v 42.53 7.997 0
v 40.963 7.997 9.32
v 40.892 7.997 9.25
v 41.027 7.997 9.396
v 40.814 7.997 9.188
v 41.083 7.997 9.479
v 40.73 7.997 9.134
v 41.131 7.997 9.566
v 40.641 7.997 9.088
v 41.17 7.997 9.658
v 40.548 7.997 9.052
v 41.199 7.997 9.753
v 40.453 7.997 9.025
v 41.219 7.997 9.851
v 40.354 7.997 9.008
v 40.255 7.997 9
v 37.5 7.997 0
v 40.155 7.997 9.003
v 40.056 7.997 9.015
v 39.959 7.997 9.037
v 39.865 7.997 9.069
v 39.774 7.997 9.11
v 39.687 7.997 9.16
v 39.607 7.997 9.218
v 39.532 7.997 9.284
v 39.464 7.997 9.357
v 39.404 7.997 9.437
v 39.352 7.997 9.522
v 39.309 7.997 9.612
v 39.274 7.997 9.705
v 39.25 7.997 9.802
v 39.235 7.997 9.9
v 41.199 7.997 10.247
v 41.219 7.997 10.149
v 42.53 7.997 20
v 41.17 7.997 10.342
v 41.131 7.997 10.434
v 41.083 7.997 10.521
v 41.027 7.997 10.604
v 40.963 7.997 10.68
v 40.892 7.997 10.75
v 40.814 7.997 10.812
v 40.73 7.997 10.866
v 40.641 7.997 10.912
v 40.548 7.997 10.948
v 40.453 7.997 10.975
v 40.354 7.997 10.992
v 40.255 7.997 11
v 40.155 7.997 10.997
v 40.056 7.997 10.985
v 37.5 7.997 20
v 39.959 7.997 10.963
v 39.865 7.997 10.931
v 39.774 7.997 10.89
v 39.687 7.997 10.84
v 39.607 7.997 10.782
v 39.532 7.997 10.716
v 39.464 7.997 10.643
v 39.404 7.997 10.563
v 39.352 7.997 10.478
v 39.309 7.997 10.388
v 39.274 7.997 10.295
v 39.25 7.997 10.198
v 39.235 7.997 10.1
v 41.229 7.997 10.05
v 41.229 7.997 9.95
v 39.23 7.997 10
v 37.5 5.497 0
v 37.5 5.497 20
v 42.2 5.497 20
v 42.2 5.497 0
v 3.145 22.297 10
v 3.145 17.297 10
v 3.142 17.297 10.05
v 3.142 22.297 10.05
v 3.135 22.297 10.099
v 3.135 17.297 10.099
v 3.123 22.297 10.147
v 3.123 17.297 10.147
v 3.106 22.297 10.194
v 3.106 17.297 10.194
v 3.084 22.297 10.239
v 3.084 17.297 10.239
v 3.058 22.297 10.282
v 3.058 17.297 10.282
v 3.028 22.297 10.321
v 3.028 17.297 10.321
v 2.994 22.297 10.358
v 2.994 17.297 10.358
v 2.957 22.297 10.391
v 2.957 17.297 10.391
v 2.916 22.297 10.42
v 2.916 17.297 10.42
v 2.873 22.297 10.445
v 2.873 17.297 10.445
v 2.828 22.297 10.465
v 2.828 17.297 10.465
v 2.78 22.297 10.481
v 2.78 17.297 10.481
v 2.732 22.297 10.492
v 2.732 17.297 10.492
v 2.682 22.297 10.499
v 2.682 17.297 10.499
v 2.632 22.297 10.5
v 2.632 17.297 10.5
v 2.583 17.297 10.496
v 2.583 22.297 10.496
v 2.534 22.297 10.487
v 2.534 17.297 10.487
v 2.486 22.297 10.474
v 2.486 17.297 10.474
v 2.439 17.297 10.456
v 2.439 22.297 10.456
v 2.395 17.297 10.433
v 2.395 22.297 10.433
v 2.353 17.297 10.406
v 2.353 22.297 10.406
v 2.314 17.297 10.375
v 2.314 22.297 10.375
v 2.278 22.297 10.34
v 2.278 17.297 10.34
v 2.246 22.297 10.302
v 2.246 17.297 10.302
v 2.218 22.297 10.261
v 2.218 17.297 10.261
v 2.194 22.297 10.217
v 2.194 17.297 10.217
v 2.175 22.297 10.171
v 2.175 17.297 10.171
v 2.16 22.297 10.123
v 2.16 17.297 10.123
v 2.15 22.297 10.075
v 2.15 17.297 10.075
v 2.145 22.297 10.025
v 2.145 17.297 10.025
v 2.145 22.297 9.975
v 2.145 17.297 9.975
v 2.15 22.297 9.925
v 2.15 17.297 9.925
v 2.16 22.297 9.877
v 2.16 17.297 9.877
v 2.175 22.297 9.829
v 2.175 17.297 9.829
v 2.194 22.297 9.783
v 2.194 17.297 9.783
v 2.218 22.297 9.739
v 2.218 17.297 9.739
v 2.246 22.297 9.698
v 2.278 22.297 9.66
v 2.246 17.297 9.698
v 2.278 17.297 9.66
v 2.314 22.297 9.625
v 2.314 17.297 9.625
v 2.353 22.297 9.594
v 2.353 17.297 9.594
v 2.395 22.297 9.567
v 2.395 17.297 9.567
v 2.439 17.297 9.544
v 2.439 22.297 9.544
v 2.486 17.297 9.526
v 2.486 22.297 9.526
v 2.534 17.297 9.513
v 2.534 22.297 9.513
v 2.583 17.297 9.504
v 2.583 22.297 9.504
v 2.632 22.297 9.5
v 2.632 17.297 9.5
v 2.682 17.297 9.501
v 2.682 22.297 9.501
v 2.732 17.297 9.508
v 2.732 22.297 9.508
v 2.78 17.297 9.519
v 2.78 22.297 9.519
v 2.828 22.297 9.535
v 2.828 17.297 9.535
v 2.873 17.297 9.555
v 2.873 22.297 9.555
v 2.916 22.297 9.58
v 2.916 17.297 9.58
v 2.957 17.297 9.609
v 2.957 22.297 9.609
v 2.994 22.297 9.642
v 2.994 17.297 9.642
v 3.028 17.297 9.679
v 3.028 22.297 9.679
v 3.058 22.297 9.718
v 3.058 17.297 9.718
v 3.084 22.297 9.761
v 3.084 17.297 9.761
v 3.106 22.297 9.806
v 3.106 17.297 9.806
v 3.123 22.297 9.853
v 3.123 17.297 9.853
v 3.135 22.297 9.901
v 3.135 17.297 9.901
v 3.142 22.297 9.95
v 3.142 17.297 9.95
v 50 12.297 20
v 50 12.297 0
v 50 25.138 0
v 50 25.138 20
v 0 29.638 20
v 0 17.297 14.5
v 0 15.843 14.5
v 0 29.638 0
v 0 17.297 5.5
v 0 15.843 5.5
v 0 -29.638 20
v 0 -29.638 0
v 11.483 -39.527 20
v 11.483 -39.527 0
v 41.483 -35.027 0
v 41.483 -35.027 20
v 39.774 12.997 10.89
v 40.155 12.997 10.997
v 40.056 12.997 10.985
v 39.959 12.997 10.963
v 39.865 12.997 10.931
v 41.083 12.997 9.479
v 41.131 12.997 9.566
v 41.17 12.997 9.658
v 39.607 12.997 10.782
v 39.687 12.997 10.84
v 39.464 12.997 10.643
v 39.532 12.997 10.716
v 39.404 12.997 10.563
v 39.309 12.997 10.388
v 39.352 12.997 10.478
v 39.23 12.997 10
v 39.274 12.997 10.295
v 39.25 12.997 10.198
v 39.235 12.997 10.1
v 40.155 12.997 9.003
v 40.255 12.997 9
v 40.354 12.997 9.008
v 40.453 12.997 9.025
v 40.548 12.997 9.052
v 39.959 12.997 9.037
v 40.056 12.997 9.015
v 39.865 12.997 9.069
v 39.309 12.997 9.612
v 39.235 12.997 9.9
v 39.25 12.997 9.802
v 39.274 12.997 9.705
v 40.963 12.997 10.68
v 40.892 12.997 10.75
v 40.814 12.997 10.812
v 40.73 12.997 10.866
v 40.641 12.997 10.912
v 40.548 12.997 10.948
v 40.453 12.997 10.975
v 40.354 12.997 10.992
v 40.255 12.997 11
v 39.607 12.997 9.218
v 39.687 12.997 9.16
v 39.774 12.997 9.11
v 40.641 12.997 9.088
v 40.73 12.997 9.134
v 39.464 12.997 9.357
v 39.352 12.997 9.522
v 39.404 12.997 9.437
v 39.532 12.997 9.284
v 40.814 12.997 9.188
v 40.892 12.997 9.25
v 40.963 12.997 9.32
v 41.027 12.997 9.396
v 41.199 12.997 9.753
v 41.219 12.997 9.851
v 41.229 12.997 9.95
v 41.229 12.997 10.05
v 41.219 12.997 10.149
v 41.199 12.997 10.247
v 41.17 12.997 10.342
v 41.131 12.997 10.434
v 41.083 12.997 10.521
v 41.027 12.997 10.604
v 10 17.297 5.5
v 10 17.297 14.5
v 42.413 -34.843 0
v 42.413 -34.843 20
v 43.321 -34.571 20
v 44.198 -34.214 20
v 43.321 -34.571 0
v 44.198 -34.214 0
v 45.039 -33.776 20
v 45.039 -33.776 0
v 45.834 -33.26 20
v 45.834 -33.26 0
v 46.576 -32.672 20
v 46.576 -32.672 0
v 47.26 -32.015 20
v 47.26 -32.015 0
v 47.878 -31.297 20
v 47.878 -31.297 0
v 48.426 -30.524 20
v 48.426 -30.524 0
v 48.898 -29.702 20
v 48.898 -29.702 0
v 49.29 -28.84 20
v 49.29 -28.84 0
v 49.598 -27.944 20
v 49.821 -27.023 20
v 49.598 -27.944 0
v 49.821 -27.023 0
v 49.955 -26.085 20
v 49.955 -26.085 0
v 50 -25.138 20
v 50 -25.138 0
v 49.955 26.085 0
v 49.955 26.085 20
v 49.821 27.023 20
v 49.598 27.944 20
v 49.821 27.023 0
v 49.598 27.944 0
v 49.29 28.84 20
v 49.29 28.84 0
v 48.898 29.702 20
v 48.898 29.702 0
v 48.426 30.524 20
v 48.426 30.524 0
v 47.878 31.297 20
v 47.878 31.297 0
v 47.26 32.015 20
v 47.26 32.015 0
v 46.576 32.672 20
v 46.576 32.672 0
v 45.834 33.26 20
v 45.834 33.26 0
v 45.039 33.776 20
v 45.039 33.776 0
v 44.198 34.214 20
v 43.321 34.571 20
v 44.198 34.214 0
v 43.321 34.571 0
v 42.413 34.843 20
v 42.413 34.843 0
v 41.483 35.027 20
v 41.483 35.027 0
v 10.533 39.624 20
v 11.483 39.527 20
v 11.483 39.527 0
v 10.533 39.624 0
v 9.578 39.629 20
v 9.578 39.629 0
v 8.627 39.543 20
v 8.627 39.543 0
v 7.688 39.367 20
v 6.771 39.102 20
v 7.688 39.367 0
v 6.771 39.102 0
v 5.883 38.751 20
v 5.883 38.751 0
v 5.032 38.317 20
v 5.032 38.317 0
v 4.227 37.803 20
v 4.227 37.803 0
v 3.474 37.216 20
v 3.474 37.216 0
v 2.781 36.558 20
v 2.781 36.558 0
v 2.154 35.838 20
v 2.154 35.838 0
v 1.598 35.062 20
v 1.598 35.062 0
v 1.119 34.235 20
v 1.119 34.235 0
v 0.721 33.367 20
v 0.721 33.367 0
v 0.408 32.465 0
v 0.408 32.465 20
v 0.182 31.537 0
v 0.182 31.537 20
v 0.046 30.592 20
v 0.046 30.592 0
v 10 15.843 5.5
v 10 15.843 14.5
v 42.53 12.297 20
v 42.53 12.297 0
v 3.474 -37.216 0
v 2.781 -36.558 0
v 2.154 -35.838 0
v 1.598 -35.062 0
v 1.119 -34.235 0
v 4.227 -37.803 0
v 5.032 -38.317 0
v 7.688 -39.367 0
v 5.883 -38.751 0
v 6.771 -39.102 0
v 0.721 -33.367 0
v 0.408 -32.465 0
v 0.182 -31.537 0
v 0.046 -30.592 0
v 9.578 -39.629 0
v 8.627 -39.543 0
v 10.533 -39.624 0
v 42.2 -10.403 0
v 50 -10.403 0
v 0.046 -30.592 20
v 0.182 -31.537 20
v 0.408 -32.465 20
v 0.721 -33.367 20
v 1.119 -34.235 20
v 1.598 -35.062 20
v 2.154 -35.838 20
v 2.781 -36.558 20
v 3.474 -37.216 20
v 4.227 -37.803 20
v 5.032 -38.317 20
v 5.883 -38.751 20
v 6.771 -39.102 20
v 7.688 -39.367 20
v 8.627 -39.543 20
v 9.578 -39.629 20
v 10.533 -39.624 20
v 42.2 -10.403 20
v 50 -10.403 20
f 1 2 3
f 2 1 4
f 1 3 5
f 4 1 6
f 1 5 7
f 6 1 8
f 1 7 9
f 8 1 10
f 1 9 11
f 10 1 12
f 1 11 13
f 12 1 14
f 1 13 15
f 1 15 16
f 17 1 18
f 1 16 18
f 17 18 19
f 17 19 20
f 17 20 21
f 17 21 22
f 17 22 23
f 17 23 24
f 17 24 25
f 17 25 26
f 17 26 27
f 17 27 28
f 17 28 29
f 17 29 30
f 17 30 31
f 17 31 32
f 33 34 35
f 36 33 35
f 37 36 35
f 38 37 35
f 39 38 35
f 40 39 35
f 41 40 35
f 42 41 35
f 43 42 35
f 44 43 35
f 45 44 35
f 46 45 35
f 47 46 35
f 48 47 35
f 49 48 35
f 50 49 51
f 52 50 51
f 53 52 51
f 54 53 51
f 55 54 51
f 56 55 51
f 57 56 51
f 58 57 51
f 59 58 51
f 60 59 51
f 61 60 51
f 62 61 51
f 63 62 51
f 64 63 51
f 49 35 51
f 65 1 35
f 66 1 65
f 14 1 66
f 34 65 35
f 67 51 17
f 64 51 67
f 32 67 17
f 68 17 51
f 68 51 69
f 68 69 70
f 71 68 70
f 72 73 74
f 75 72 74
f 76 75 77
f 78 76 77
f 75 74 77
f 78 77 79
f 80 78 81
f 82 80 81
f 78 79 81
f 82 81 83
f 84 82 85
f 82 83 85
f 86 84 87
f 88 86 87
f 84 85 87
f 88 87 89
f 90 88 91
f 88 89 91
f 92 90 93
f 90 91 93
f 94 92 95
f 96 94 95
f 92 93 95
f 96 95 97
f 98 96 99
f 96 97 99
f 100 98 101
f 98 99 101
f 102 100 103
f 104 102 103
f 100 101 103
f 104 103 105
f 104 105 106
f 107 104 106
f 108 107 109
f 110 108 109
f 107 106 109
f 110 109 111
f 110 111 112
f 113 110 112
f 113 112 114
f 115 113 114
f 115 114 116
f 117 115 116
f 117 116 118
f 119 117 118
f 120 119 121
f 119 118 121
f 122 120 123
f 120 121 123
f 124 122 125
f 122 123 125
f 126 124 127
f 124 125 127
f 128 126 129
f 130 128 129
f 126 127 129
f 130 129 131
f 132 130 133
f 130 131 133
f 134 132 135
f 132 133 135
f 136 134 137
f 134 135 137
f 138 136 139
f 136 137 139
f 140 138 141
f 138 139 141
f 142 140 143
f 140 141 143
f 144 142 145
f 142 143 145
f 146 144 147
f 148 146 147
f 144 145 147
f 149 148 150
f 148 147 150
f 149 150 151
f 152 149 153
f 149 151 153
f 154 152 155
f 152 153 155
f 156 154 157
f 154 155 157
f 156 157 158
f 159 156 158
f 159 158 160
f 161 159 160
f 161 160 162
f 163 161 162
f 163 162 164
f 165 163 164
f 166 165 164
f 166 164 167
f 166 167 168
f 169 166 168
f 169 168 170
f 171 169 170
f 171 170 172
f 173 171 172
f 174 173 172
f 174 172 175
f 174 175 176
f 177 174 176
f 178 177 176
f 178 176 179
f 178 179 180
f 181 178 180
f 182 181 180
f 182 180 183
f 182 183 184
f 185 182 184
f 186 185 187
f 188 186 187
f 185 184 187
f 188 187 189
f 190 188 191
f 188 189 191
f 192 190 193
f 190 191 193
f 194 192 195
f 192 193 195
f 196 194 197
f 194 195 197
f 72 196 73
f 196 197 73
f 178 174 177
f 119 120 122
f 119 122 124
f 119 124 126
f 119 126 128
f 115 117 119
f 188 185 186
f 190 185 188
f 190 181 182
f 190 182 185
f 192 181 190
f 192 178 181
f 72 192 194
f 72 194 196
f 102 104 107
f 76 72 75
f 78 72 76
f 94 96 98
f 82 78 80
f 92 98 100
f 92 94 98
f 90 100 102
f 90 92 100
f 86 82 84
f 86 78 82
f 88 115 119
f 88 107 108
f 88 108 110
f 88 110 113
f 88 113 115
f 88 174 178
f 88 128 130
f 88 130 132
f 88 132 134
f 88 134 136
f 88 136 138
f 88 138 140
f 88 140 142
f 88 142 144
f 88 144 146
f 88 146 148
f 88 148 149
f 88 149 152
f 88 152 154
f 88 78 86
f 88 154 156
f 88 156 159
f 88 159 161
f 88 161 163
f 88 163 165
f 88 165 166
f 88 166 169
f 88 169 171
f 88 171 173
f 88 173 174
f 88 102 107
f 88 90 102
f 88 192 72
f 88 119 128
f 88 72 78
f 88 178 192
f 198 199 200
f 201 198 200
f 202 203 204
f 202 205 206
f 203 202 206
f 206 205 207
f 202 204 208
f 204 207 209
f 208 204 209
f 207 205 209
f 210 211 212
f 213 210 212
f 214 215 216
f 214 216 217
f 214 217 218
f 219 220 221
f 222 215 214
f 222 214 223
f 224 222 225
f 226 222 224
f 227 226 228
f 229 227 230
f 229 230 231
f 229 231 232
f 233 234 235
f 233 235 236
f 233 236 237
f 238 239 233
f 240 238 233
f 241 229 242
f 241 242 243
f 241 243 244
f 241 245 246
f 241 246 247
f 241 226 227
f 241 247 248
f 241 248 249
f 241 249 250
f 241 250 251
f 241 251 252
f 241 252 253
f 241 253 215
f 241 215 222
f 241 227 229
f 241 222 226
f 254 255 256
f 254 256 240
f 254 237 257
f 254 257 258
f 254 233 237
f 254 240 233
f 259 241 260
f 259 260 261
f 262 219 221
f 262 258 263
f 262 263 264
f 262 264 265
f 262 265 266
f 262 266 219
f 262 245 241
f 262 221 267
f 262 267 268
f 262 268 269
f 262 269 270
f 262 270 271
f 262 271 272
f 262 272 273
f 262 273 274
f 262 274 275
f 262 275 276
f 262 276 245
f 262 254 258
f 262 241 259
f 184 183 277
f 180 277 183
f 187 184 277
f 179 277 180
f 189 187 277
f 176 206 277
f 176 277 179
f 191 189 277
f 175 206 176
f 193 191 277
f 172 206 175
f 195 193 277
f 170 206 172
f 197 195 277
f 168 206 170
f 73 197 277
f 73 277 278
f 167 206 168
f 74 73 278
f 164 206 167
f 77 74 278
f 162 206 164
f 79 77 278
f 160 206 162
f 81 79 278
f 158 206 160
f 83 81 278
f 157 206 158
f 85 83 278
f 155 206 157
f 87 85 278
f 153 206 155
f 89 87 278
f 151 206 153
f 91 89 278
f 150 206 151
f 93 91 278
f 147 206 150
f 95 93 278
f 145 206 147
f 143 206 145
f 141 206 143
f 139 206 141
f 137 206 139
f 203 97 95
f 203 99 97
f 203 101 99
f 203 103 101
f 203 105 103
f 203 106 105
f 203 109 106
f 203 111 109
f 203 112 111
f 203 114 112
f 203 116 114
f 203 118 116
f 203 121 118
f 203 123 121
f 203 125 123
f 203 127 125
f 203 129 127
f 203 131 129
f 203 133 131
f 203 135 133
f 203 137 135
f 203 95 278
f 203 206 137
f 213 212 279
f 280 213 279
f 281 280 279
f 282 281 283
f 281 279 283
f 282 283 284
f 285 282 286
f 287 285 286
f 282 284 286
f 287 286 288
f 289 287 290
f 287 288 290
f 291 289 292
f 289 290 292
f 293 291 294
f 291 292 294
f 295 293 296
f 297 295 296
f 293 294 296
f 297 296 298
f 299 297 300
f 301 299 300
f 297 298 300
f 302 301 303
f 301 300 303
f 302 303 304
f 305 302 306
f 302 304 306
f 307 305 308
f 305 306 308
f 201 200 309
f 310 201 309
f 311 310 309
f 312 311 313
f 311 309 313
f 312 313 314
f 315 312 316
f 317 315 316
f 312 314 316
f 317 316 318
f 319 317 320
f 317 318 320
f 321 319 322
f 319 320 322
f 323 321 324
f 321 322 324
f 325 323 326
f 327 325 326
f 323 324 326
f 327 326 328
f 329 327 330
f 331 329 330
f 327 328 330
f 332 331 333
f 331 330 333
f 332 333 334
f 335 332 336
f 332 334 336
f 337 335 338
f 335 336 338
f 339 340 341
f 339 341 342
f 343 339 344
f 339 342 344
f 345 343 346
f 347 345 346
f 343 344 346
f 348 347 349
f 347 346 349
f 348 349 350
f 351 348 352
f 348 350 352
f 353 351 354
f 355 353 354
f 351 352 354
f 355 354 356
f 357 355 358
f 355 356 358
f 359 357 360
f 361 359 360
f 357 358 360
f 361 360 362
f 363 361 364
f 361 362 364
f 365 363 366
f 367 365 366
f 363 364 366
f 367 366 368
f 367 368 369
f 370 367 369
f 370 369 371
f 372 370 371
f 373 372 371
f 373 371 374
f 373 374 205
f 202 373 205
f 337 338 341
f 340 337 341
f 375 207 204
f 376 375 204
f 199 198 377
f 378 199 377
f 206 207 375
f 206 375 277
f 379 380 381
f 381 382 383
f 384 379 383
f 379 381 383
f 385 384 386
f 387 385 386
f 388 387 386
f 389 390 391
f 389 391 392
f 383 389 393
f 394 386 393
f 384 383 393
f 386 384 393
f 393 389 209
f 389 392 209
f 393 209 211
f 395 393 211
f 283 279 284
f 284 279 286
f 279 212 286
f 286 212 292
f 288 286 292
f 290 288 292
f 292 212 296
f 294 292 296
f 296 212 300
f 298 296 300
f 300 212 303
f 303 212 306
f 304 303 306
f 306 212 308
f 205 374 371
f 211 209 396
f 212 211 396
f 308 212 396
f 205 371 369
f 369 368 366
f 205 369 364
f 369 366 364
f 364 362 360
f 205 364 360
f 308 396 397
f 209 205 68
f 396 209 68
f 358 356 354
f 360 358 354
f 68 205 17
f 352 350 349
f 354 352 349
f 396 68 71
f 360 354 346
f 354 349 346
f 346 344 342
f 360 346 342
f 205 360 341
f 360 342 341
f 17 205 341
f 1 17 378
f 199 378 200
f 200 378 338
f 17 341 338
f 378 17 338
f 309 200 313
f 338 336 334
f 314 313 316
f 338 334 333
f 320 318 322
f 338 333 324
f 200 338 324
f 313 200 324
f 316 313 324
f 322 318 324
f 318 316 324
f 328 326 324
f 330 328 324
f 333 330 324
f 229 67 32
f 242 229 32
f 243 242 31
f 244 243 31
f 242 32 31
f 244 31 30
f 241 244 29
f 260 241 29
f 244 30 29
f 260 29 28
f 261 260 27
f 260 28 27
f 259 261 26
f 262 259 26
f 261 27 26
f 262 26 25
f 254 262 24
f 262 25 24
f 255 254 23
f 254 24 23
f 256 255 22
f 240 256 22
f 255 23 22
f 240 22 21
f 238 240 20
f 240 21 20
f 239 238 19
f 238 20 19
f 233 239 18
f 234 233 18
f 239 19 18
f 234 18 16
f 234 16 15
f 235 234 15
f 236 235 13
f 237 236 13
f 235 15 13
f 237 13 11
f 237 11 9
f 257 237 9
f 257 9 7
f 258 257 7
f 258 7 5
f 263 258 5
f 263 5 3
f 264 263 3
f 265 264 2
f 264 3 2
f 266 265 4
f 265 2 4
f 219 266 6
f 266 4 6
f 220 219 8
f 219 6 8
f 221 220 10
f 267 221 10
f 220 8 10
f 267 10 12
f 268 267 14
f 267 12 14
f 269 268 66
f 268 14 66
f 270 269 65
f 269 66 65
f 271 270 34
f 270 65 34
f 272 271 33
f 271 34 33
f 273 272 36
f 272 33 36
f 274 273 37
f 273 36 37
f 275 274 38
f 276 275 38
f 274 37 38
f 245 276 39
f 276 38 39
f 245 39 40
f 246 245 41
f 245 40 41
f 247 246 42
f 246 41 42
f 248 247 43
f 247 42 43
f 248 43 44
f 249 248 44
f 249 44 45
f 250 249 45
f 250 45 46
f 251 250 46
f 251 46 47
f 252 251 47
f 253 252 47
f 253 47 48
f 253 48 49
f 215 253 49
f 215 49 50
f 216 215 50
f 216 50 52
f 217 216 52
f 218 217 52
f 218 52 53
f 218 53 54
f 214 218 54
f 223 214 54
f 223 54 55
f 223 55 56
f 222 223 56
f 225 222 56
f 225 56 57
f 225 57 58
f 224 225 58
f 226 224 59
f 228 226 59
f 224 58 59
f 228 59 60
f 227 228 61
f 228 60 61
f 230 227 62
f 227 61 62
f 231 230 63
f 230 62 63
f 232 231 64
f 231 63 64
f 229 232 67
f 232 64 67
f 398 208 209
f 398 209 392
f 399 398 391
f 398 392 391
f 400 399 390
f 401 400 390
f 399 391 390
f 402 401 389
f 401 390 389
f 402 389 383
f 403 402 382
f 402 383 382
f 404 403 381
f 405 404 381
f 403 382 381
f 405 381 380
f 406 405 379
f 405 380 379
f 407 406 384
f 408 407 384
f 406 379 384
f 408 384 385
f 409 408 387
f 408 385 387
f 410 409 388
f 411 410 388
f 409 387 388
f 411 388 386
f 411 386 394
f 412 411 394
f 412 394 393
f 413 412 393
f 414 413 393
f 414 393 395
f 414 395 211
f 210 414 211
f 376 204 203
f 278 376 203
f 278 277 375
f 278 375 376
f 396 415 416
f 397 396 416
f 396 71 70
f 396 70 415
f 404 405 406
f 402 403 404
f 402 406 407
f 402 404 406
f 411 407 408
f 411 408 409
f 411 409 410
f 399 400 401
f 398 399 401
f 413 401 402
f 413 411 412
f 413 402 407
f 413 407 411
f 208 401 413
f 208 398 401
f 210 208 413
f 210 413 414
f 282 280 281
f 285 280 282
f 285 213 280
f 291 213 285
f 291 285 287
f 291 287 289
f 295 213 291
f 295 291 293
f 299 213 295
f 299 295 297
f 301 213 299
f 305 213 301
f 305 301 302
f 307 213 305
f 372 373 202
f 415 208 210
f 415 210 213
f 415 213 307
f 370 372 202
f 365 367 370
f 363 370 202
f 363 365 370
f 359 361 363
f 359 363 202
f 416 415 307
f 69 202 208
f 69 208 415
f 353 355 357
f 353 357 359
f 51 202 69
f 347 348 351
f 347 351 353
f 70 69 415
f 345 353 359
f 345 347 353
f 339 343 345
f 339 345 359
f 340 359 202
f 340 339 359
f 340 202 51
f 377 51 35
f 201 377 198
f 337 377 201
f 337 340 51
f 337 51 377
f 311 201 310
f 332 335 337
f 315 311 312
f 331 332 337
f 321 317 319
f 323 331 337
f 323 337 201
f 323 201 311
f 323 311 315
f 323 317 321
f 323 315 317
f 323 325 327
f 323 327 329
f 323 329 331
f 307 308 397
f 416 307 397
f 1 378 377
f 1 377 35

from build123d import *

# Parameters (mm, degrees)
BOSS_EXTRUDE1_DEPTH = 20
SKETCH5_W           = 9
SKETCH5_H           = 1.454272164
CUT_EXTRUDE4_DEPTH  = 10
SKETCH6_R           = 0.5
CUT_EXTRUDE5_DEPTH  = 5
CUT_EXTRUDE6_DEPTH  = 21
SKETCH11_R          = 1
CUT_EXTRUDE7_DEPTH  = 5


with BuildPart() as part:
    # Sketch1 → Boss-Extrude1 (new body)
    with BuildSketch(Plane.XY):
        with BuildLine():
            Line((0, 29.638125792), (0, -29.638125792))
            ThreePointArc((0, -29.638125792), (3.474436626, -37.215527896), (11.483404529, -39.527489321))
            Line((11.483404529, -39.527489321), (41.483404529, -35.027489321))
            ThreePointArc((41.483404529, -35.027489321), (47.577402104, -31.663689166), (50, -25.138125792))
            Line((50, -25.138125792), (50, 25.138125792))
            ThreePointArc((50, 25.138125792), (47.577402104, 31.663689166), (41.483404529, 35.027489321))
            Line((41.483404529, 35.027489321), (11.483404529, 39.527489321))
            ThreePointArc((11.483404529, 39.527489321), (3.474436626, 37.215527896), (0, 29.638125792))
        make_face()
    extrude(amount=BOSS_EXTRUDE1_DEPTH)

    # Sketch5 → Cut-Extrude4 (cut)
    with BuildSketch(Plane.ZY):
        with Locations((10, 16.569972364)):
            Rectangle(SKETCH5_W, SKETCH5_H)
    extrude(amount=-CUT_EXTRUDE4_DEPTH, mode=Mode.SUBTRACT)

    # Sketch6 → Cut-Extrude5 (cut)
    with BuildSketch(Plane.XZ.offset(-17.297108446)):
        with Locations((2.644871575, 10)):
            Circle(SKETCH6_R)
    extrude(amount=-CUT_EXTRUDE5_DEPTH, mode=Mode.SUBTRACT)

    # Sketch9 → Cut-Extrude6 (cut, through all)
    with BuildSketch(Plane.XY.offset(20)):
        Polygon((42.2, 5.497108446), (42.2, -10.402891554), (50, -10.402891554), (50, 12.297108446), (42.53, 12.297108446), (42.53, 7.997108446), (37.5, 7.997108446), (37.5, 5.497108446), align=None)
    extrude(amount=-CUT_EXTRUDE6_DEPTH, mode=Mode.SUBTRACT)

    # Sketch11 → Cut-Extrude7 (cut)
    with BuildSketch(Plane(origin=(0, 7.997108446, 0), x_dir=(-1, 0, 0), z_dir=(0, -1, 0))):
        with Locations((-40.23, -10)):
            Circle(SKETCH11_R)
    extrude(amount=-CUT_EXTRUDE7_DEPTH, mode=Mode.SUBTRACT)


solid = part.part
